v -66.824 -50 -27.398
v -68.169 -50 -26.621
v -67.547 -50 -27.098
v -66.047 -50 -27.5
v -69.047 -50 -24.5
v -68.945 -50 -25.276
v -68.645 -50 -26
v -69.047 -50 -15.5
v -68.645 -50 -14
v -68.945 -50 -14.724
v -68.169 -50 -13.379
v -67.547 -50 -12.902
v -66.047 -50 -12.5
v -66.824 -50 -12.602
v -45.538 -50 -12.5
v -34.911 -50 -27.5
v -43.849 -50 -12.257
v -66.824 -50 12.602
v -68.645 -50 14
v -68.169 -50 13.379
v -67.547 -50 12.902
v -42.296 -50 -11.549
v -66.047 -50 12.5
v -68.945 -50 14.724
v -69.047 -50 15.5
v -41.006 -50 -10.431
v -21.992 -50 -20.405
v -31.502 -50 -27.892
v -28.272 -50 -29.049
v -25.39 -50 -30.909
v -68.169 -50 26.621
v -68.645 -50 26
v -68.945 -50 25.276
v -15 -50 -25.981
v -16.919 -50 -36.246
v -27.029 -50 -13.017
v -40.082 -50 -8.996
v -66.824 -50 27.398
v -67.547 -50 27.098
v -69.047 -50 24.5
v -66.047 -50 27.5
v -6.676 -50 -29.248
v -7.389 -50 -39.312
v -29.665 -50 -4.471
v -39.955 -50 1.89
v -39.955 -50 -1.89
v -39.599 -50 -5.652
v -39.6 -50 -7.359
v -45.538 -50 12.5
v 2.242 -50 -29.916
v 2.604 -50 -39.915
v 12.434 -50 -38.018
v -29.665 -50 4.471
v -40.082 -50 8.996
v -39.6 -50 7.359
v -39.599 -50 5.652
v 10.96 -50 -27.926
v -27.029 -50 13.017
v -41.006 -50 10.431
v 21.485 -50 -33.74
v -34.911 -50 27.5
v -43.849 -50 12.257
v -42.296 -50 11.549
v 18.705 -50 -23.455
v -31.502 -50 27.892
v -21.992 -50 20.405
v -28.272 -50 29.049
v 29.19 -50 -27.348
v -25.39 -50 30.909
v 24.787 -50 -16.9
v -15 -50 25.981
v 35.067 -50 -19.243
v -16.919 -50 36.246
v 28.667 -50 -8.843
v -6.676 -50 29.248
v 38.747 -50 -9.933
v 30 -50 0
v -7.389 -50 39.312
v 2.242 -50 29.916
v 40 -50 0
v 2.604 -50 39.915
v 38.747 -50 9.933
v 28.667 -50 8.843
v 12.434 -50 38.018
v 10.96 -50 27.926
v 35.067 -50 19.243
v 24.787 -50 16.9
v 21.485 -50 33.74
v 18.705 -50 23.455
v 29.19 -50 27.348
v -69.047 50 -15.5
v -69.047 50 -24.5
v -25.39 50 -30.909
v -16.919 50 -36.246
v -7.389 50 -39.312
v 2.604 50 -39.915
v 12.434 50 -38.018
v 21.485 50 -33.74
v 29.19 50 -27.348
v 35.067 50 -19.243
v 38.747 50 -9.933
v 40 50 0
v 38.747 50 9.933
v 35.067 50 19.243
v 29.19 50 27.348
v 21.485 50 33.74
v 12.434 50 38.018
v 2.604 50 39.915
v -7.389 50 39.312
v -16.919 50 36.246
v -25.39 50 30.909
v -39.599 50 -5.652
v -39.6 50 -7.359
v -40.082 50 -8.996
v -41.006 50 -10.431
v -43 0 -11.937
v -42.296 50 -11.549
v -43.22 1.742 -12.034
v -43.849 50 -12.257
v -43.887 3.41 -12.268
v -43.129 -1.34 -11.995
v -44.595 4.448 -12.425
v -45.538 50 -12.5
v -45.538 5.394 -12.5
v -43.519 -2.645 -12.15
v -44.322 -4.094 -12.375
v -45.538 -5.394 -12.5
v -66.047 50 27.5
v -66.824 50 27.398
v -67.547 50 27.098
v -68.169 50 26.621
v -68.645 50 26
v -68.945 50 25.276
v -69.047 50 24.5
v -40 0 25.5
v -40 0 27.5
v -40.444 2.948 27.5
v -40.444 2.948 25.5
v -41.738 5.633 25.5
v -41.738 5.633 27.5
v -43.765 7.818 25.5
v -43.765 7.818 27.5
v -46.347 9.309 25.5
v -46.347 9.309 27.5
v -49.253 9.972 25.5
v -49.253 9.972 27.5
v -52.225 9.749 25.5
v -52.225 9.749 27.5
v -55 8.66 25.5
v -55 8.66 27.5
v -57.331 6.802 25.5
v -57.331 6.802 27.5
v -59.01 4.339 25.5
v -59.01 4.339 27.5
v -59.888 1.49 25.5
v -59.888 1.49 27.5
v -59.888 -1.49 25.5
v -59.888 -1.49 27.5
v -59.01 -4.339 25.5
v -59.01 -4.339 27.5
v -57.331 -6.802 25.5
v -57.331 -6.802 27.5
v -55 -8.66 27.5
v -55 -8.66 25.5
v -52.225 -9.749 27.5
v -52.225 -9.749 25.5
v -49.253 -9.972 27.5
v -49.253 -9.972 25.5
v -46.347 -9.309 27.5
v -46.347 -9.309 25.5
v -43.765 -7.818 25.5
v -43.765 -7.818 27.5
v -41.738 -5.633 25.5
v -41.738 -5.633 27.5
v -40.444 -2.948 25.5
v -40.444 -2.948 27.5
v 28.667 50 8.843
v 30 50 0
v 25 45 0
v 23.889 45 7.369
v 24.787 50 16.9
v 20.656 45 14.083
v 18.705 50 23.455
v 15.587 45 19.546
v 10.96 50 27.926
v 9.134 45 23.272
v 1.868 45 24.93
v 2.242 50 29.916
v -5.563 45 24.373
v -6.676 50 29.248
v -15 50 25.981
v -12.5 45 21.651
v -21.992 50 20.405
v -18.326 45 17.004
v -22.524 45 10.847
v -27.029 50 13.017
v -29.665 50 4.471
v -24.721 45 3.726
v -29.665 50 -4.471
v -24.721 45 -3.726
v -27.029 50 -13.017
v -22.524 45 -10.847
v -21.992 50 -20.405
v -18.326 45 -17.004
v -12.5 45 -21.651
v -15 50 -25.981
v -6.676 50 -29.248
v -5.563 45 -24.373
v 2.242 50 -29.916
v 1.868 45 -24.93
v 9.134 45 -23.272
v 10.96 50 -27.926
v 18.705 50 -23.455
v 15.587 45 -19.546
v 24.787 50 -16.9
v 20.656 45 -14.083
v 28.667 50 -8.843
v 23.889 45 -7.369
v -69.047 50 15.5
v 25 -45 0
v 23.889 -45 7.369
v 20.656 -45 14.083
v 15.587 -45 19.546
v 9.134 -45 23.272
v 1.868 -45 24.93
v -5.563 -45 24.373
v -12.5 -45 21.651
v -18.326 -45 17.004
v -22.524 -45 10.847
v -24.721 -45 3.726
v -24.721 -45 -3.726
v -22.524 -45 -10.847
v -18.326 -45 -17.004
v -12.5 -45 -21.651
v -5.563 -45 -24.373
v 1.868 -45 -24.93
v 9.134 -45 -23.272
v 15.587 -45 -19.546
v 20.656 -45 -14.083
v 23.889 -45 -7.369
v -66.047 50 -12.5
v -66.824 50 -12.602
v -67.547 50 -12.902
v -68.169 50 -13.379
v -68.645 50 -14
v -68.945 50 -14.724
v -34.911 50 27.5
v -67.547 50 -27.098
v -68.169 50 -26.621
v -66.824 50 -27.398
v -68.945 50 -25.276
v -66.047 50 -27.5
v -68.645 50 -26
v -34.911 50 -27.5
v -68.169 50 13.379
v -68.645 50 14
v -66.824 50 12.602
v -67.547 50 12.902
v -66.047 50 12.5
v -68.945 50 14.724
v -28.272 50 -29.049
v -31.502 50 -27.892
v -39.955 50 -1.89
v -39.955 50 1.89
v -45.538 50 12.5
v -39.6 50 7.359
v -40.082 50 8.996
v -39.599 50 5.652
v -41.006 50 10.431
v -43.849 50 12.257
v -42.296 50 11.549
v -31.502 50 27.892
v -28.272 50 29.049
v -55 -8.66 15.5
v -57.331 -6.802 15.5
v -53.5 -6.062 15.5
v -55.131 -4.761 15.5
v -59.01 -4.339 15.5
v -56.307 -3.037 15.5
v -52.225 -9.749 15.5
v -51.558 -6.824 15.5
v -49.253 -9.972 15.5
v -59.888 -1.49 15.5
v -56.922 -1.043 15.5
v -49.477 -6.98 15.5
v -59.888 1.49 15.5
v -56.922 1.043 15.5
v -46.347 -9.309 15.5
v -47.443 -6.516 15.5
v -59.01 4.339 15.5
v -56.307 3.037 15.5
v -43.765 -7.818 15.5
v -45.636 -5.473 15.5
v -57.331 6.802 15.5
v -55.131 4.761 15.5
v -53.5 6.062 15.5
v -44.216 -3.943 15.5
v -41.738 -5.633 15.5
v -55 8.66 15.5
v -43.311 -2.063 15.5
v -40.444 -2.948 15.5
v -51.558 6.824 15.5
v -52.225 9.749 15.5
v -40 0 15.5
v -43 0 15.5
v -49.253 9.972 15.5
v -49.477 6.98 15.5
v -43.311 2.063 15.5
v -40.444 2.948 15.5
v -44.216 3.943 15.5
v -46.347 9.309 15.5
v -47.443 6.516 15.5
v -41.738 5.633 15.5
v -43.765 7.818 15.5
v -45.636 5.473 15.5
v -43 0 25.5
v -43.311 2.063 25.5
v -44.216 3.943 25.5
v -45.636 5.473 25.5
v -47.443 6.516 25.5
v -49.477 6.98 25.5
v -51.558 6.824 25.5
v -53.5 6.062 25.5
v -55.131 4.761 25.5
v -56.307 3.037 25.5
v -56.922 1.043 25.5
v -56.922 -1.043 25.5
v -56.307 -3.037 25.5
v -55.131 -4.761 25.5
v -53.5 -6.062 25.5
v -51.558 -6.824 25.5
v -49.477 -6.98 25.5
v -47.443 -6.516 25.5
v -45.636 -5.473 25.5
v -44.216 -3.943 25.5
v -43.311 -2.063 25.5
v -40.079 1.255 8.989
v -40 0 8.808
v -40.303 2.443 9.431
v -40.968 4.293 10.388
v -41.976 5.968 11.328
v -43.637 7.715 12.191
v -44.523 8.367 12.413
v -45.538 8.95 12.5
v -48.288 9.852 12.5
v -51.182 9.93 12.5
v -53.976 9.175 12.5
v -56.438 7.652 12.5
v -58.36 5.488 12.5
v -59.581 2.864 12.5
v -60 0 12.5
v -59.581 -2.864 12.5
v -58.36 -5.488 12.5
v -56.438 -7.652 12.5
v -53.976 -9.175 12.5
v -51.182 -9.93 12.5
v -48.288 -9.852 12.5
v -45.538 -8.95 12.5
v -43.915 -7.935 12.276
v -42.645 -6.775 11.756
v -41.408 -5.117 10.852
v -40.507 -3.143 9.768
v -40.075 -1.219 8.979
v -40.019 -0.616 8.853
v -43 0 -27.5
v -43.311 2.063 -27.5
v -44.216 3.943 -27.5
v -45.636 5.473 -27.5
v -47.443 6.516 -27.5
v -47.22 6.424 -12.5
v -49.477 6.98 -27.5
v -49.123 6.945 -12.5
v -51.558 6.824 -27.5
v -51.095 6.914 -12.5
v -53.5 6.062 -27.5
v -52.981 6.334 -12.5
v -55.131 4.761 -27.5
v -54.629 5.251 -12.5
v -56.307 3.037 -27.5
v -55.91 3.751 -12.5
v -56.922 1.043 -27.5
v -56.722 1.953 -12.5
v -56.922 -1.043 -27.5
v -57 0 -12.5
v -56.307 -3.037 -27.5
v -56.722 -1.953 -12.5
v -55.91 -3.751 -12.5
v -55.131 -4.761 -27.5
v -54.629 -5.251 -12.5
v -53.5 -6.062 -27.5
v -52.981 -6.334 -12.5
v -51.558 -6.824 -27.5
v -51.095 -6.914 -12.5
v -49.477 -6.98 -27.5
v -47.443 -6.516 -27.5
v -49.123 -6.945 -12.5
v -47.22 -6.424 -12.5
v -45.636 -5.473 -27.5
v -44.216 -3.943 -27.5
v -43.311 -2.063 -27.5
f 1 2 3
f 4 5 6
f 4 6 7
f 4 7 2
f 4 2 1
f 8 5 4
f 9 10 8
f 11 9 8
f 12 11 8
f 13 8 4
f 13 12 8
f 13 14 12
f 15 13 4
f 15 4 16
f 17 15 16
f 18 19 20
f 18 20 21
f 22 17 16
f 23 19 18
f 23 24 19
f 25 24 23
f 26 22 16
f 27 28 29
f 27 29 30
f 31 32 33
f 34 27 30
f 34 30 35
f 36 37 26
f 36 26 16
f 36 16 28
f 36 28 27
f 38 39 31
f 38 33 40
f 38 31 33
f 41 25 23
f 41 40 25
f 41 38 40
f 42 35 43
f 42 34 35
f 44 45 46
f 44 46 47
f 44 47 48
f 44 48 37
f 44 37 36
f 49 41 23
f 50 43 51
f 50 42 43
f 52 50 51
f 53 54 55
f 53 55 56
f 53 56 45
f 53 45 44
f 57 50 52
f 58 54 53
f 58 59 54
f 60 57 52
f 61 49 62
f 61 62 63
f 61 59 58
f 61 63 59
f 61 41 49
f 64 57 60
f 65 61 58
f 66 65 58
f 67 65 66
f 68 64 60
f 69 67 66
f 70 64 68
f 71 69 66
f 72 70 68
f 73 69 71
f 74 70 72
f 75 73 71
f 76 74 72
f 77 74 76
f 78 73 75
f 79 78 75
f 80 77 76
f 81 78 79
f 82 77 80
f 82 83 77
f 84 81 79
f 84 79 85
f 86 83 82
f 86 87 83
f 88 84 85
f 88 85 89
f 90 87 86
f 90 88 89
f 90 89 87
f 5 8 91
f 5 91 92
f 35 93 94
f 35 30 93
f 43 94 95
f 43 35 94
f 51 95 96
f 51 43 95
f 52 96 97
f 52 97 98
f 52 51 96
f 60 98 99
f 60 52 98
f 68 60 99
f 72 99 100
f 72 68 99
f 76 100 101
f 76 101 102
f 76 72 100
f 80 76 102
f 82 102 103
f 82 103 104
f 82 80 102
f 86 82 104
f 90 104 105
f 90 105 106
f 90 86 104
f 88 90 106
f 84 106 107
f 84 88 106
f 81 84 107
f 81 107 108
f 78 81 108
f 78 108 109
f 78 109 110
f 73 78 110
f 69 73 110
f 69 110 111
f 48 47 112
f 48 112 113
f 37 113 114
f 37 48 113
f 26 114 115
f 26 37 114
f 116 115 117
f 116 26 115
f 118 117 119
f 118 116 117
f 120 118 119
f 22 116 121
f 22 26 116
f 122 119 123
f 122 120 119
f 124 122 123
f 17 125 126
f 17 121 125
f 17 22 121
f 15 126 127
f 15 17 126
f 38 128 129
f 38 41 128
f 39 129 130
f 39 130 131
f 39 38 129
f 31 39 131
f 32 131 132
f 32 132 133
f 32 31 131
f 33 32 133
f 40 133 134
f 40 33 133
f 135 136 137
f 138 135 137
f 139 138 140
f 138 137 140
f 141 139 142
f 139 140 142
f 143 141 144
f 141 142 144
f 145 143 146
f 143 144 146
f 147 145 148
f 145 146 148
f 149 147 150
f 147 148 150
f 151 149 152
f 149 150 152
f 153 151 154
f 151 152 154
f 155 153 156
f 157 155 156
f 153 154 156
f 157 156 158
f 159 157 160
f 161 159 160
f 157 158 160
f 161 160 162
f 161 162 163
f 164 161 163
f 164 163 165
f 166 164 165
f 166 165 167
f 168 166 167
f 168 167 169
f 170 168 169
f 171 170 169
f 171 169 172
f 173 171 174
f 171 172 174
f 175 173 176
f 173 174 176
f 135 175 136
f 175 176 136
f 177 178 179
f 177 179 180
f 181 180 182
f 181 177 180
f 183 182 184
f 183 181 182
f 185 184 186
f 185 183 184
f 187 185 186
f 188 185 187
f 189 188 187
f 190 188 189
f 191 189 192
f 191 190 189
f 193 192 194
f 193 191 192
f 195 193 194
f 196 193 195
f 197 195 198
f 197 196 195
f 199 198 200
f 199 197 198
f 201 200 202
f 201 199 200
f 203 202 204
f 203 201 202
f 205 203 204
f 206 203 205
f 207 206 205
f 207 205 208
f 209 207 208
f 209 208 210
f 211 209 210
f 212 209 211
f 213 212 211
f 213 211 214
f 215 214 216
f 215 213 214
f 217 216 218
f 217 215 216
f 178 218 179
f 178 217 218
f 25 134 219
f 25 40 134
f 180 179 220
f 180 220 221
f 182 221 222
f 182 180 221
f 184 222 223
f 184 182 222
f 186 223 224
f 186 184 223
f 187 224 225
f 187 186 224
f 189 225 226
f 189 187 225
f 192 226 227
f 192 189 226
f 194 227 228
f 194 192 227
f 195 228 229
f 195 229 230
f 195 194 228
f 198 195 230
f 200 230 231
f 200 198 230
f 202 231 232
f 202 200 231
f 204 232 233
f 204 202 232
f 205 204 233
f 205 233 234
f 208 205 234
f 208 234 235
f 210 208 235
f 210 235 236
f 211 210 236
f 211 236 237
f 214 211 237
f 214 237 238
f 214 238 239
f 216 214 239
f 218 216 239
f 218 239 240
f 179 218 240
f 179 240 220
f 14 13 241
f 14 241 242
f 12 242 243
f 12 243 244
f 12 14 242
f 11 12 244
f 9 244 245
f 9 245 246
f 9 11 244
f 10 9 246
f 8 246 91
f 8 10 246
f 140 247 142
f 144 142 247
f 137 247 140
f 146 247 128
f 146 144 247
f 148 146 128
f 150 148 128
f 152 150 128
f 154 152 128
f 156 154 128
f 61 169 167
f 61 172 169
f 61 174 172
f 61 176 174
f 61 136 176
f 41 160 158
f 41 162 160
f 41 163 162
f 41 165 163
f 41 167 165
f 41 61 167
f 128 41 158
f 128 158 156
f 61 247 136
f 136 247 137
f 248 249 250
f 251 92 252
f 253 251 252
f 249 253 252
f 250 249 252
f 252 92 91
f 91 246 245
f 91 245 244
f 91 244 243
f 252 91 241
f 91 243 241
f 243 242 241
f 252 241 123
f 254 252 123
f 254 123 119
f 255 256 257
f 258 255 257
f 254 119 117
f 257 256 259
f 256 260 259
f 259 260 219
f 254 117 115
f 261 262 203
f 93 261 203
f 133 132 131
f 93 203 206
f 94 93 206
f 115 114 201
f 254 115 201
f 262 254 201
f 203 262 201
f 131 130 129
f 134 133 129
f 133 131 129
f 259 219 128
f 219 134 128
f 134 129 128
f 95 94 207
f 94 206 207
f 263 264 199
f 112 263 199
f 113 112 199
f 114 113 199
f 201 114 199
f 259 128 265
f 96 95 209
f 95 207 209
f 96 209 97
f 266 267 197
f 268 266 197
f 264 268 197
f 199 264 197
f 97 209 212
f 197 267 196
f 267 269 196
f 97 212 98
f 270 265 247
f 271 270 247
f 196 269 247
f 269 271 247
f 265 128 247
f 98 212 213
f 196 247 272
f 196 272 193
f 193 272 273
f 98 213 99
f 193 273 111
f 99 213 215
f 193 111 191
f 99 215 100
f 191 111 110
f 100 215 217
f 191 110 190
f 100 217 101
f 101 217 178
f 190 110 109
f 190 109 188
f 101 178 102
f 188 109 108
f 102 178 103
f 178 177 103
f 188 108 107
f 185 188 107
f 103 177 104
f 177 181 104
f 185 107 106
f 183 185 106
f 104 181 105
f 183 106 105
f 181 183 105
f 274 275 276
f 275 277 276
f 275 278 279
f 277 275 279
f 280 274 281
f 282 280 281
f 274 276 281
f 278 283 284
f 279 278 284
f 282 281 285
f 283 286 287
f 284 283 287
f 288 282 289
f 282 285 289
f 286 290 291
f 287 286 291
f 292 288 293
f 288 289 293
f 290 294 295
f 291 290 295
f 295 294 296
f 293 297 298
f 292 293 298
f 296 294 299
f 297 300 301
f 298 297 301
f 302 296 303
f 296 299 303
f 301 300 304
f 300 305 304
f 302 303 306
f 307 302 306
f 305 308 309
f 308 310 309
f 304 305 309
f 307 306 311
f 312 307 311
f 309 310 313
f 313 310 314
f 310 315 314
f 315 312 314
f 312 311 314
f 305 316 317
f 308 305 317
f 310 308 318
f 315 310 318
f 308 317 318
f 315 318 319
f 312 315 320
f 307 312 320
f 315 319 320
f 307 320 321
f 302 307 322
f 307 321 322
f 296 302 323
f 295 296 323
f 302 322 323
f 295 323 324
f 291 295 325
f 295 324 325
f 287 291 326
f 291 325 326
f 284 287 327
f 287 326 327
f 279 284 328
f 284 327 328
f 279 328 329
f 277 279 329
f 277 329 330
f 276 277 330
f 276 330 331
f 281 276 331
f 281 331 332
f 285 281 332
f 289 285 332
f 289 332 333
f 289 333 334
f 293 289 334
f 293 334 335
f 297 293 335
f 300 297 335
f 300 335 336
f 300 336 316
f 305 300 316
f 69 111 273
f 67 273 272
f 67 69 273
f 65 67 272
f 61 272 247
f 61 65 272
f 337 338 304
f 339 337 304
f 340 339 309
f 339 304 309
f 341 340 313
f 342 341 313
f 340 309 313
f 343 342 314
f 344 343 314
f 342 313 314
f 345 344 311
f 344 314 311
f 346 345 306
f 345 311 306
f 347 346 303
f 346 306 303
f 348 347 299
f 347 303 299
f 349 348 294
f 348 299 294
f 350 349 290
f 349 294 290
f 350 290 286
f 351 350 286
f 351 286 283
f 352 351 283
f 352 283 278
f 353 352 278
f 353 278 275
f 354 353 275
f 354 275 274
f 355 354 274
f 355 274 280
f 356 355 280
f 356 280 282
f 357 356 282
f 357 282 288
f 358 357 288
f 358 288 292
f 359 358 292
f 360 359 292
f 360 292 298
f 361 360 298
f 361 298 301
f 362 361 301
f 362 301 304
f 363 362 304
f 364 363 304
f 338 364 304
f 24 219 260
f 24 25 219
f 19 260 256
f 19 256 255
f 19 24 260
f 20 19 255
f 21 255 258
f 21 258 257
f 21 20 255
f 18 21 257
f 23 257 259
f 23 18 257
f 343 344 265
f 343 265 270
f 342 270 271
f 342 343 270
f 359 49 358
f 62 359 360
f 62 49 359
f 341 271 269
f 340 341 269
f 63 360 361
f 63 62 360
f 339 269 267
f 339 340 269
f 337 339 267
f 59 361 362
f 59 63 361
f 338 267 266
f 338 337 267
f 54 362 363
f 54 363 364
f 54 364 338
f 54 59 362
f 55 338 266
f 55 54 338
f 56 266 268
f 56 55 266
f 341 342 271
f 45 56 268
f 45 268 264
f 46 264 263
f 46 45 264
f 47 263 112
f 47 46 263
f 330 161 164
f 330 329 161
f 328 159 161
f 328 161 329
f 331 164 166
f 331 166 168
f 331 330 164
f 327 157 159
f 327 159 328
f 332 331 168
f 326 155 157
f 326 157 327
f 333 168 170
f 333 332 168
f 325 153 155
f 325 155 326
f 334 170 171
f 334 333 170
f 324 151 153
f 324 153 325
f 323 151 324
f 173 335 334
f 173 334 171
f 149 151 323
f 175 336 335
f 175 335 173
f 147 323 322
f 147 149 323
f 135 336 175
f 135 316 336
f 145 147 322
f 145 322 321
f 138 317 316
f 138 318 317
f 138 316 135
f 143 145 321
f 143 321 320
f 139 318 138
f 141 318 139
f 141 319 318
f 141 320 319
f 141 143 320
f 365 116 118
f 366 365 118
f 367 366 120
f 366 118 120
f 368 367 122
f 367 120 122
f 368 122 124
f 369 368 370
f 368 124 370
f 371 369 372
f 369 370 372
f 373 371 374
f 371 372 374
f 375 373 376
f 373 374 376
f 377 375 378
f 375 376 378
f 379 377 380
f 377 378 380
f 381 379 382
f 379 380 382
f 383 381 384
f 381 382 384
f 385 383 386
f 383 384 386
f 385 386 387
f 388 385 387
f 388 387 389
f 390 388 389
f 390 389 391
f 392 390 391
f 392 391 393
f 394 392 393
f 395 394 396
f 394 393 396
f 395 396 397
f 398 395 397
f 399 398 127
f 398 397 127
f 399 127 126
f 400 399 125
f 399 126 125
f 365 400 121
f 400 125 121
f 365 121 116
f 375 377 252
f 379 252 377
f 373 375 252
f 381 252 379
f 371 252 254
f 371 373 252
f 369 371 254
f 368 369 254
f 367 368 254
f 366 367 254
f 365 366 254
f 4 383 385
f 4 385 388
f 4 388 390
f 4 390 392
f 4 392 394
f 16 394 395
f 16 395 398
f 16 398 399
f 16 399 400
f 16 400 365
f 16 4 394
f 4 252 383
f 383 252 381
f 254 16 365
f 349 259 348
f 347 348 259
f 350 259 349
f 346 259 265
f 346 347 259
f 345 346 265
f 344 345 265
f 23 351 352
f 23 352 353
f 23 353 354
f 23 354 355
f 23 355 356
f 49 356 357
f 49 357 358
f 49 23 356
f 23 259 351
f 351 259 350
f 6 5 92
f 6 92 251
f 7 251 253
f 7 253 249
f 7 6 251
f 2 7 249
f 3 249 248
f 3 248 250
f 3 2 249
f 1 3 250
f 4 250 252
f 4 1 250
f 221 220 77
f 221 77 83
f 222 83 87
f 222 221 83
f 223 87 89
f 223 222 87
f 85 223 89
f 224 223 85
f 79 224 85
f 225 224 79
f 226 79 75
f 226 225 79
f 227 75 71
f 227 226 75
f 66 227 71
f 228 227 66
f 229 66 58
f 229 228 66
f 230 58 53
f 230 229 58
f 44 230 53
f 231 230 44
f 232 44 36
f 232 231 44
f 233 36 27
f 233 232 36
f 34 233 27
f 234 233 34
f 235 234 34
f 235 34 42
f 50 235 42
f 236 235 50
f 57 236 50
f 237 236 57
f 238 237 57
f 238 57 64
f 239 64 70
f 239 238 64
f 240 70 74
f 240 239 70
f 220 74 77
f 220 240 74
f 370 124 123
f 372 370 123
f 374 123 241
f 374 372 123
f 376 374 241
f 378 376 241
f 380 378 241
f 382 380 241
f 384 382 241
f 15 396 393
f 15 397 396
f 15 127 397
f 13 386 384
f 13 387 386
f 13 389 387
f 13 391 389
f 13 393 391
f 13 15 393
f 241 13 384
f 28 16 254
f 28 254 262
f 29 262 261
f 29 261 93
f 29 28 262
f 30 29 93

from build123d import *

# Parameters (mm, degrees)
F0_R          = 25
F1_DEPTH      = 50
F2_SIZE       = 5
F3_R          = 7
F4_DEPTH      = 80
F4_DEPTH_BACK = 25
F3_R_2        = 10
F5_DEPTH      = 2
F6_START      = -12
F6_DEPTH      = 8


with BuildPart() as f1:
    # F0 (on Front) → F1 (new body, symmetric)
    with BuildSketch(Plane.XZ):
        with BuildLine():
            ThreePointArc((-45.5384452963, 12.5), (-41.0059538996, 10.4314783147), (-39.5986480837, 5.652173913))
            ThreePointArc((-39.5986480837, 5.652173913), (-40, 0), (-39.5986480837, -5.652173913))
            ThreePointArc((-39.5986480837, -5.652173913), (-41.0059538996, -10.4314783147), (-45.5384452963, -12.5))
            Line((-45.5384452963, -12.5), (-66.0473750966, -12.5))
            ThreePointArc((-66.0473750966, -12.5), (-68.1686954401, -13.3786796564), (-69.0473750966, -15.5))
            Line((-69.0473750966, -15.5), (-69.0473750966, -24.5))
            ThreePointArc((-69.0473750966, -24.5), (-68.1686954401, -26.6213203436), (-66.0473750966, -27.5))
            Line((-66.0473750966, -27.5), (-34.9106001094, -27.5))
            ThreePointArc((-34.9106001094, -27.5), (-29.8541011409, -28.3779669246), (-25.3895273523, -30.9090909091))
            ThreePointArc((-25.3895273523, -30.9090909091), (40, 0), (-25.3895273523, 30.9090909091))
            ThreePointArc((-25.3895273523, 30.9090909091), (-29.8541011409, 28.3779669246), (-34.9106001094, 27.5))
            Line((-34.9106001094, 27.5), (-66.0473750966, 27.5))
            ThreePointArc((-66.0473750966, 27.5), (-68.1686954401, 26.6213203436), (-69.0473750966, 24.5))
            Line((-69.0473750966, 24.5), (-69.0473750966, 15.5))
            ThreePointArc((-69.0473750966, 15.5), (-68.1686954401, 13.3786796564), (-66.0473750966, 12.5))
            Line((-66.0473750966, 12.5), (-45.5384452963, 12.5))
        make_face()
        Circle(F0_R, mode=Mode.SUBTRACT)
    extrude(amount=F1_DEPTH, both=True)

    # F2
    f2_edges = [f1.edges().sort_by_distance(p)[0] for p in [
        (-25, -50, 0),
        (-25, 50, 0),
    ]]
    chamfer(f2_edges, length=F2_SIZE)

    # F3 (on face) → F4 (cut, two sides)
    with BuildSketch(Plane.XY.offset(27.5)) as f4_sk:
        with Locations((-50, 0)):
            Circle(F3_R)
    extrude(amount=-F4_DEPTH, mode=Mode.SUBTRACT)
    extrude(f4_sk.sketch, amount=F4_DEPTH_BACK, mode=Mode.SUBTRACT)

    # F3 (on face) → F5 (cut)
    with BuildSketch(Plane.XY.offset(27.5)):
        with Locations((-50, 0)):
            Circle(F3_R_2)
        with Locations((-50, 0)):
            Circle(F3_R, mode=Mode.SUBTRACT)
    extrude(amount=-F5_DEPTH, mode=Mode.SUBTRACT)

    # F3 (on face) → F6 (cut)
    with BuildSketch(Plane.XY.offset(27.5).offset(F6_START)):
        with Locations((-50, 0)):
            Circle(F3_R_2)
        with Locations((-50, 0)):
            Circle(F3_R, mode=Mode.SUBTRACT)
    extrude(amount=-F6_DEPTH, mode=Mode.SUBTRACT)


solid = f1.part
